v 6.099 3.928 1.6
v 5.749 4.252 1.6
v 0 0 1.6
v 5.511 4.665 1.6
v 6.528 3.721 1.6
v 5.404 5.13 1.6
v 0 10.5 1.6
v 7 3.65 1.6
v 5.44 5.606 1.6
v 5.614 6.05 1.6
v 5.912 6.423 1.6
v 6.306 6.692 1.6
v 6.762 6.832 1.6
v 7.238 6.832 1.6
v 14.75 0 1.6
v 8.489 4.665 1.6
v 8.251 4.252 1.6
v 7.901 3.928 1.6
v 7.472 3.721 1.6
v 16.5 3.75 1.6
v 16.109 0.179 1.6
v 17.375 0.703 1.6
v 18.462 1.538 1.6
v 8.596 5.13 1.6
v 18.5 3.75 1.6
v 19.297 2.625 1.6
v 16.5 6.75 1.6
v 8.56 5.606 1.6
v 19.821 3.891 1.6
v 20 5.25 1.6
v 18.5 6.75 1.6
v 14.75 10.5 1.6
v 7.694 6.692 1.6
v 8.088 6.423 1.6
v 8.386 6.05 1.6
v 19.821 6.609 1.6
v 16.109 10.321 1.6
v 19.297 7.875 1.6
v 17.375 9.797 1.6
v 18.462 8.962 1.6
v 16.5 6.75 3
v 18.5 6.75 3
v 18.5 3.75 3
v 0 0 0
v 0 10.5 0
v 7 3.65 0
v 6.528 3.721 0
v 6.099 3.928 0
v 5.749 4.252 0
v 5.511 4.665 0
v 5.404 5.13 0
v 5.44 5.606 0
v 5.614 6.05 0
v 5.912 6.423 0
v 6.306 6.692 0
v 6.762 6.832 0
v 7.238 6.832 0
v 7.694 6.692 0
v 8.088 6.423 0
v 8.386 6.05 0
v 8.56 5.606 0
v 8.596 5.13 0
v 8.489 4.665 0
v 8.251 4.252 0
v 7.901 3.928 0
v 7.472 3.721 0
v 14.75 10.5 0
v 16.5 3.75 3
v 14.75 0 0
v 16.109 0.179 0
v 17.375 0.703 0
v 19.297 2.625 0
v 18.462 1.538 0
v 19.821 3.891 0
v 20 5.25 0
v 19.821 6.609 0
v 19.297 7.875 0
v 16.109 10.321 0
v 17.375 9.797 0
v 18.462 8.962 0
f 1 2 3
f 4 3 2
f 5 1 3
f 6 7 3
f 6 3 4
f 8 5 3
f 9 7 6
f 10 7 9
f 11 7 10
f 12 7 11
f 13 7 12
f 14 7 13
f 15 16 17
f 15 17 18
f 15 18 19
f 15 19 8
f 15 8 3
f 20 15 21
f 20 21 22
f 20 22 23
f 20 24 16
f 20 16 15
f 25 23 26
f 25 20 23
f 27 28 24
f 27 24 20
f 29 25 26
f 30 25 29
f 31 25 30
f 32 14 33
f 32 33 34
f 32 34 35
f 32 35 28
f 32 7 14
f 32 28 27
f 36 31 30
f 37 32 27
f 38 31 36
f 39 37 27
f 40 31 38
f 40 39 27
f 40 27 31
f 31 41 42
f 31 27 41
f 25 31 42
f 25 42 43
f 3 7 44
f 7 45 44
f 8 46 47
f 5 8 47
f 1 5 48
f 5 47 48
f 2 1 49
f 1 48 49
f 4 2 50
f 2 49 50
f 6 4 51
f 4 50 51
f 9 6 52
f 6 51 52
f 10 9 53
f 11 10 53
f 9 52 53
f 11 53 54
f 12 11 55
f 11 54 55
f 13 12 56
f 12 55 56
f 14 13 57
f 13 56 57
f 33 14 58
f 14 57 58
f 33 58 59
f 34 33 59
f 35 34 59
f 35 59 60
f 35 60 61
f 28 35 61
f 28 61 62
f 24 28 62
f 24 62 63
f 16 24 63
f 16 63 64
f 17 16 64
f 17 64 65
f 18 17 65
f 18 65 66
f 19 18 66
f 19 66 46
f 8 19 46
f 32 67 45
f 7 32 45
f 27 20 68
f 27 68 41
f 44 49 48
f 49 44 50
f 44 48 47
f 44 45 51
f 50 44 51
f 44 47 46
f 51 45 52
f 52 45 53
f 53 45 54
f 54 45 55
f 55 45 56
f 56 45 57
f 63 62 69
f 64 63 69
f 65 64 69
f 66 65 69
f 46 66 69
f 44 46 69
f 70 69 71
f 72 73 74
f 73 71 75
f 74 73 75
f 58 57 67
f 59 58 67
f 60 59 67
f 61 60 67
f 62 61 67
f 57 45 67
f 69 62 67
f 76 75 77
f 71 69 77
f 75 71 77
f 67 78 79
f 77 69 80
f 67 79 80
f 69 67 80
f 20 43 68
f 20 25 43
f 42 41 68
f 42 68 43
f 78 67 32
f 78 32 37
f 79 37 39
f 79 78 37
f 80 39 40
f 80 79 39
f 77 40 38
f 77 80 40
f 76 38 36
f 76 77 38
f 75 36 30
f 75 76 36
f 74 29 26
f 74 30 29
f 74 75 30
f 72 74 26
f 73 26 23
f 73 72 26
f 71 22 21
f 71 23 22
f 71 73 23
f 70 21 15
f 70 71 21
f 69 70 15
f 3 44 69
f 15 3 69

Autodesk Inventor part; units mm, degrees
ref_plane "YZ Plane" through (0, 0, 0) normal (1, 0, 0) x (0, 1, 0)
ref_plane "XZ Plane" through (0, 0, 0) normal (0, 1, 0) x (-1, 0, 0)
ref_plane "XY Plane" through (0, 0, 0) normal (0, 0, 1) x (1, 0, 0)
sketch "Sketch1" plane through (0, 0, 0) normal (0, 0, 1) x (1, 0, 0)
  line L0 (0, 0) -> (14.75, 0)
  arc A0 (14.75, 0) -> (14.75, 10.5) centre (14.75, 5.25) ccw
  line L1 (14.75, 10.5) -> (0, 10.5)
  line L2 (0, 10.5) -> (0, 0)
  dimension "d0" = 10.5
  dimension "d1" = 20
extrude "Extrusion1" add sketch "Sketch1" along normal blind 1.6
sketch "Esquisse2" plane through (0, 0, 1.6) normal (0, 0, 1) x (1, 0, 0)
  line L0 (0, 0) -> (14.75, 0) construction
  arc A0 (14.75, 0) -> (14.75, 10.5) centre (14.75, 5.25) ccw construction
  line L1 (14.75, 10.5) -> (0, 10.5) construction
  line L2 (0, 10.5) -> (0, 0) construction
  line L3 (16.5, 6.75) -> (18.5, 6.75)
  line L4 (18.5, 6.75) -> (18.5, 3.75)
  line L5 (18.5, 3.75) -> (16.5, 3.75)
  line L6 (16.5, 3.75) -> (16.5, 6.75)
  point P0 (16.5, 5.25)
  dimension "d4" = 3
  dimension "d5" = 2
  dimension "d6" = 18.5
extrude "Extrusion2" add sketch "Esquisse2" along normal blind 1.4
sketch "Esquisse3" plane through (0, 0, 1.6) normal (0, 0, 1) x (1, 0, 0)
  line L0 (18.5, 6.75) -> (18.5, 3.75) construction
  line L1 (18.5, 3.75) -> (16.5, 3.75) construction
  line L2 (16.5, 3.75) -> (16.5, 6.75) construction
  line L3 (16.5, 6.75) -> (18.5, 6.75) construction
  line L4 (0, 0) -> (14.75, 0) construction
  arc A0 (14.75, 0) -> (14.75, 10.5) centre (14.75, 5.25) ccw construction
  line L5 (14.75, 10.5) -> (0, 10.5) construction
  line L6 (0, 10.5) -> (0, 0) construction
  line L7 (0, 5.25) -> (14.75, 5.25) construction
  point P0 (7, 5.25)
  dimension "d9" = 7
hole "Perçage1" at (7, 5.25, 1.6) direction (0, 0, -1) diameter 3.2 end through all
properties part number "FE015" material "Fourniture / Geliefertes"
